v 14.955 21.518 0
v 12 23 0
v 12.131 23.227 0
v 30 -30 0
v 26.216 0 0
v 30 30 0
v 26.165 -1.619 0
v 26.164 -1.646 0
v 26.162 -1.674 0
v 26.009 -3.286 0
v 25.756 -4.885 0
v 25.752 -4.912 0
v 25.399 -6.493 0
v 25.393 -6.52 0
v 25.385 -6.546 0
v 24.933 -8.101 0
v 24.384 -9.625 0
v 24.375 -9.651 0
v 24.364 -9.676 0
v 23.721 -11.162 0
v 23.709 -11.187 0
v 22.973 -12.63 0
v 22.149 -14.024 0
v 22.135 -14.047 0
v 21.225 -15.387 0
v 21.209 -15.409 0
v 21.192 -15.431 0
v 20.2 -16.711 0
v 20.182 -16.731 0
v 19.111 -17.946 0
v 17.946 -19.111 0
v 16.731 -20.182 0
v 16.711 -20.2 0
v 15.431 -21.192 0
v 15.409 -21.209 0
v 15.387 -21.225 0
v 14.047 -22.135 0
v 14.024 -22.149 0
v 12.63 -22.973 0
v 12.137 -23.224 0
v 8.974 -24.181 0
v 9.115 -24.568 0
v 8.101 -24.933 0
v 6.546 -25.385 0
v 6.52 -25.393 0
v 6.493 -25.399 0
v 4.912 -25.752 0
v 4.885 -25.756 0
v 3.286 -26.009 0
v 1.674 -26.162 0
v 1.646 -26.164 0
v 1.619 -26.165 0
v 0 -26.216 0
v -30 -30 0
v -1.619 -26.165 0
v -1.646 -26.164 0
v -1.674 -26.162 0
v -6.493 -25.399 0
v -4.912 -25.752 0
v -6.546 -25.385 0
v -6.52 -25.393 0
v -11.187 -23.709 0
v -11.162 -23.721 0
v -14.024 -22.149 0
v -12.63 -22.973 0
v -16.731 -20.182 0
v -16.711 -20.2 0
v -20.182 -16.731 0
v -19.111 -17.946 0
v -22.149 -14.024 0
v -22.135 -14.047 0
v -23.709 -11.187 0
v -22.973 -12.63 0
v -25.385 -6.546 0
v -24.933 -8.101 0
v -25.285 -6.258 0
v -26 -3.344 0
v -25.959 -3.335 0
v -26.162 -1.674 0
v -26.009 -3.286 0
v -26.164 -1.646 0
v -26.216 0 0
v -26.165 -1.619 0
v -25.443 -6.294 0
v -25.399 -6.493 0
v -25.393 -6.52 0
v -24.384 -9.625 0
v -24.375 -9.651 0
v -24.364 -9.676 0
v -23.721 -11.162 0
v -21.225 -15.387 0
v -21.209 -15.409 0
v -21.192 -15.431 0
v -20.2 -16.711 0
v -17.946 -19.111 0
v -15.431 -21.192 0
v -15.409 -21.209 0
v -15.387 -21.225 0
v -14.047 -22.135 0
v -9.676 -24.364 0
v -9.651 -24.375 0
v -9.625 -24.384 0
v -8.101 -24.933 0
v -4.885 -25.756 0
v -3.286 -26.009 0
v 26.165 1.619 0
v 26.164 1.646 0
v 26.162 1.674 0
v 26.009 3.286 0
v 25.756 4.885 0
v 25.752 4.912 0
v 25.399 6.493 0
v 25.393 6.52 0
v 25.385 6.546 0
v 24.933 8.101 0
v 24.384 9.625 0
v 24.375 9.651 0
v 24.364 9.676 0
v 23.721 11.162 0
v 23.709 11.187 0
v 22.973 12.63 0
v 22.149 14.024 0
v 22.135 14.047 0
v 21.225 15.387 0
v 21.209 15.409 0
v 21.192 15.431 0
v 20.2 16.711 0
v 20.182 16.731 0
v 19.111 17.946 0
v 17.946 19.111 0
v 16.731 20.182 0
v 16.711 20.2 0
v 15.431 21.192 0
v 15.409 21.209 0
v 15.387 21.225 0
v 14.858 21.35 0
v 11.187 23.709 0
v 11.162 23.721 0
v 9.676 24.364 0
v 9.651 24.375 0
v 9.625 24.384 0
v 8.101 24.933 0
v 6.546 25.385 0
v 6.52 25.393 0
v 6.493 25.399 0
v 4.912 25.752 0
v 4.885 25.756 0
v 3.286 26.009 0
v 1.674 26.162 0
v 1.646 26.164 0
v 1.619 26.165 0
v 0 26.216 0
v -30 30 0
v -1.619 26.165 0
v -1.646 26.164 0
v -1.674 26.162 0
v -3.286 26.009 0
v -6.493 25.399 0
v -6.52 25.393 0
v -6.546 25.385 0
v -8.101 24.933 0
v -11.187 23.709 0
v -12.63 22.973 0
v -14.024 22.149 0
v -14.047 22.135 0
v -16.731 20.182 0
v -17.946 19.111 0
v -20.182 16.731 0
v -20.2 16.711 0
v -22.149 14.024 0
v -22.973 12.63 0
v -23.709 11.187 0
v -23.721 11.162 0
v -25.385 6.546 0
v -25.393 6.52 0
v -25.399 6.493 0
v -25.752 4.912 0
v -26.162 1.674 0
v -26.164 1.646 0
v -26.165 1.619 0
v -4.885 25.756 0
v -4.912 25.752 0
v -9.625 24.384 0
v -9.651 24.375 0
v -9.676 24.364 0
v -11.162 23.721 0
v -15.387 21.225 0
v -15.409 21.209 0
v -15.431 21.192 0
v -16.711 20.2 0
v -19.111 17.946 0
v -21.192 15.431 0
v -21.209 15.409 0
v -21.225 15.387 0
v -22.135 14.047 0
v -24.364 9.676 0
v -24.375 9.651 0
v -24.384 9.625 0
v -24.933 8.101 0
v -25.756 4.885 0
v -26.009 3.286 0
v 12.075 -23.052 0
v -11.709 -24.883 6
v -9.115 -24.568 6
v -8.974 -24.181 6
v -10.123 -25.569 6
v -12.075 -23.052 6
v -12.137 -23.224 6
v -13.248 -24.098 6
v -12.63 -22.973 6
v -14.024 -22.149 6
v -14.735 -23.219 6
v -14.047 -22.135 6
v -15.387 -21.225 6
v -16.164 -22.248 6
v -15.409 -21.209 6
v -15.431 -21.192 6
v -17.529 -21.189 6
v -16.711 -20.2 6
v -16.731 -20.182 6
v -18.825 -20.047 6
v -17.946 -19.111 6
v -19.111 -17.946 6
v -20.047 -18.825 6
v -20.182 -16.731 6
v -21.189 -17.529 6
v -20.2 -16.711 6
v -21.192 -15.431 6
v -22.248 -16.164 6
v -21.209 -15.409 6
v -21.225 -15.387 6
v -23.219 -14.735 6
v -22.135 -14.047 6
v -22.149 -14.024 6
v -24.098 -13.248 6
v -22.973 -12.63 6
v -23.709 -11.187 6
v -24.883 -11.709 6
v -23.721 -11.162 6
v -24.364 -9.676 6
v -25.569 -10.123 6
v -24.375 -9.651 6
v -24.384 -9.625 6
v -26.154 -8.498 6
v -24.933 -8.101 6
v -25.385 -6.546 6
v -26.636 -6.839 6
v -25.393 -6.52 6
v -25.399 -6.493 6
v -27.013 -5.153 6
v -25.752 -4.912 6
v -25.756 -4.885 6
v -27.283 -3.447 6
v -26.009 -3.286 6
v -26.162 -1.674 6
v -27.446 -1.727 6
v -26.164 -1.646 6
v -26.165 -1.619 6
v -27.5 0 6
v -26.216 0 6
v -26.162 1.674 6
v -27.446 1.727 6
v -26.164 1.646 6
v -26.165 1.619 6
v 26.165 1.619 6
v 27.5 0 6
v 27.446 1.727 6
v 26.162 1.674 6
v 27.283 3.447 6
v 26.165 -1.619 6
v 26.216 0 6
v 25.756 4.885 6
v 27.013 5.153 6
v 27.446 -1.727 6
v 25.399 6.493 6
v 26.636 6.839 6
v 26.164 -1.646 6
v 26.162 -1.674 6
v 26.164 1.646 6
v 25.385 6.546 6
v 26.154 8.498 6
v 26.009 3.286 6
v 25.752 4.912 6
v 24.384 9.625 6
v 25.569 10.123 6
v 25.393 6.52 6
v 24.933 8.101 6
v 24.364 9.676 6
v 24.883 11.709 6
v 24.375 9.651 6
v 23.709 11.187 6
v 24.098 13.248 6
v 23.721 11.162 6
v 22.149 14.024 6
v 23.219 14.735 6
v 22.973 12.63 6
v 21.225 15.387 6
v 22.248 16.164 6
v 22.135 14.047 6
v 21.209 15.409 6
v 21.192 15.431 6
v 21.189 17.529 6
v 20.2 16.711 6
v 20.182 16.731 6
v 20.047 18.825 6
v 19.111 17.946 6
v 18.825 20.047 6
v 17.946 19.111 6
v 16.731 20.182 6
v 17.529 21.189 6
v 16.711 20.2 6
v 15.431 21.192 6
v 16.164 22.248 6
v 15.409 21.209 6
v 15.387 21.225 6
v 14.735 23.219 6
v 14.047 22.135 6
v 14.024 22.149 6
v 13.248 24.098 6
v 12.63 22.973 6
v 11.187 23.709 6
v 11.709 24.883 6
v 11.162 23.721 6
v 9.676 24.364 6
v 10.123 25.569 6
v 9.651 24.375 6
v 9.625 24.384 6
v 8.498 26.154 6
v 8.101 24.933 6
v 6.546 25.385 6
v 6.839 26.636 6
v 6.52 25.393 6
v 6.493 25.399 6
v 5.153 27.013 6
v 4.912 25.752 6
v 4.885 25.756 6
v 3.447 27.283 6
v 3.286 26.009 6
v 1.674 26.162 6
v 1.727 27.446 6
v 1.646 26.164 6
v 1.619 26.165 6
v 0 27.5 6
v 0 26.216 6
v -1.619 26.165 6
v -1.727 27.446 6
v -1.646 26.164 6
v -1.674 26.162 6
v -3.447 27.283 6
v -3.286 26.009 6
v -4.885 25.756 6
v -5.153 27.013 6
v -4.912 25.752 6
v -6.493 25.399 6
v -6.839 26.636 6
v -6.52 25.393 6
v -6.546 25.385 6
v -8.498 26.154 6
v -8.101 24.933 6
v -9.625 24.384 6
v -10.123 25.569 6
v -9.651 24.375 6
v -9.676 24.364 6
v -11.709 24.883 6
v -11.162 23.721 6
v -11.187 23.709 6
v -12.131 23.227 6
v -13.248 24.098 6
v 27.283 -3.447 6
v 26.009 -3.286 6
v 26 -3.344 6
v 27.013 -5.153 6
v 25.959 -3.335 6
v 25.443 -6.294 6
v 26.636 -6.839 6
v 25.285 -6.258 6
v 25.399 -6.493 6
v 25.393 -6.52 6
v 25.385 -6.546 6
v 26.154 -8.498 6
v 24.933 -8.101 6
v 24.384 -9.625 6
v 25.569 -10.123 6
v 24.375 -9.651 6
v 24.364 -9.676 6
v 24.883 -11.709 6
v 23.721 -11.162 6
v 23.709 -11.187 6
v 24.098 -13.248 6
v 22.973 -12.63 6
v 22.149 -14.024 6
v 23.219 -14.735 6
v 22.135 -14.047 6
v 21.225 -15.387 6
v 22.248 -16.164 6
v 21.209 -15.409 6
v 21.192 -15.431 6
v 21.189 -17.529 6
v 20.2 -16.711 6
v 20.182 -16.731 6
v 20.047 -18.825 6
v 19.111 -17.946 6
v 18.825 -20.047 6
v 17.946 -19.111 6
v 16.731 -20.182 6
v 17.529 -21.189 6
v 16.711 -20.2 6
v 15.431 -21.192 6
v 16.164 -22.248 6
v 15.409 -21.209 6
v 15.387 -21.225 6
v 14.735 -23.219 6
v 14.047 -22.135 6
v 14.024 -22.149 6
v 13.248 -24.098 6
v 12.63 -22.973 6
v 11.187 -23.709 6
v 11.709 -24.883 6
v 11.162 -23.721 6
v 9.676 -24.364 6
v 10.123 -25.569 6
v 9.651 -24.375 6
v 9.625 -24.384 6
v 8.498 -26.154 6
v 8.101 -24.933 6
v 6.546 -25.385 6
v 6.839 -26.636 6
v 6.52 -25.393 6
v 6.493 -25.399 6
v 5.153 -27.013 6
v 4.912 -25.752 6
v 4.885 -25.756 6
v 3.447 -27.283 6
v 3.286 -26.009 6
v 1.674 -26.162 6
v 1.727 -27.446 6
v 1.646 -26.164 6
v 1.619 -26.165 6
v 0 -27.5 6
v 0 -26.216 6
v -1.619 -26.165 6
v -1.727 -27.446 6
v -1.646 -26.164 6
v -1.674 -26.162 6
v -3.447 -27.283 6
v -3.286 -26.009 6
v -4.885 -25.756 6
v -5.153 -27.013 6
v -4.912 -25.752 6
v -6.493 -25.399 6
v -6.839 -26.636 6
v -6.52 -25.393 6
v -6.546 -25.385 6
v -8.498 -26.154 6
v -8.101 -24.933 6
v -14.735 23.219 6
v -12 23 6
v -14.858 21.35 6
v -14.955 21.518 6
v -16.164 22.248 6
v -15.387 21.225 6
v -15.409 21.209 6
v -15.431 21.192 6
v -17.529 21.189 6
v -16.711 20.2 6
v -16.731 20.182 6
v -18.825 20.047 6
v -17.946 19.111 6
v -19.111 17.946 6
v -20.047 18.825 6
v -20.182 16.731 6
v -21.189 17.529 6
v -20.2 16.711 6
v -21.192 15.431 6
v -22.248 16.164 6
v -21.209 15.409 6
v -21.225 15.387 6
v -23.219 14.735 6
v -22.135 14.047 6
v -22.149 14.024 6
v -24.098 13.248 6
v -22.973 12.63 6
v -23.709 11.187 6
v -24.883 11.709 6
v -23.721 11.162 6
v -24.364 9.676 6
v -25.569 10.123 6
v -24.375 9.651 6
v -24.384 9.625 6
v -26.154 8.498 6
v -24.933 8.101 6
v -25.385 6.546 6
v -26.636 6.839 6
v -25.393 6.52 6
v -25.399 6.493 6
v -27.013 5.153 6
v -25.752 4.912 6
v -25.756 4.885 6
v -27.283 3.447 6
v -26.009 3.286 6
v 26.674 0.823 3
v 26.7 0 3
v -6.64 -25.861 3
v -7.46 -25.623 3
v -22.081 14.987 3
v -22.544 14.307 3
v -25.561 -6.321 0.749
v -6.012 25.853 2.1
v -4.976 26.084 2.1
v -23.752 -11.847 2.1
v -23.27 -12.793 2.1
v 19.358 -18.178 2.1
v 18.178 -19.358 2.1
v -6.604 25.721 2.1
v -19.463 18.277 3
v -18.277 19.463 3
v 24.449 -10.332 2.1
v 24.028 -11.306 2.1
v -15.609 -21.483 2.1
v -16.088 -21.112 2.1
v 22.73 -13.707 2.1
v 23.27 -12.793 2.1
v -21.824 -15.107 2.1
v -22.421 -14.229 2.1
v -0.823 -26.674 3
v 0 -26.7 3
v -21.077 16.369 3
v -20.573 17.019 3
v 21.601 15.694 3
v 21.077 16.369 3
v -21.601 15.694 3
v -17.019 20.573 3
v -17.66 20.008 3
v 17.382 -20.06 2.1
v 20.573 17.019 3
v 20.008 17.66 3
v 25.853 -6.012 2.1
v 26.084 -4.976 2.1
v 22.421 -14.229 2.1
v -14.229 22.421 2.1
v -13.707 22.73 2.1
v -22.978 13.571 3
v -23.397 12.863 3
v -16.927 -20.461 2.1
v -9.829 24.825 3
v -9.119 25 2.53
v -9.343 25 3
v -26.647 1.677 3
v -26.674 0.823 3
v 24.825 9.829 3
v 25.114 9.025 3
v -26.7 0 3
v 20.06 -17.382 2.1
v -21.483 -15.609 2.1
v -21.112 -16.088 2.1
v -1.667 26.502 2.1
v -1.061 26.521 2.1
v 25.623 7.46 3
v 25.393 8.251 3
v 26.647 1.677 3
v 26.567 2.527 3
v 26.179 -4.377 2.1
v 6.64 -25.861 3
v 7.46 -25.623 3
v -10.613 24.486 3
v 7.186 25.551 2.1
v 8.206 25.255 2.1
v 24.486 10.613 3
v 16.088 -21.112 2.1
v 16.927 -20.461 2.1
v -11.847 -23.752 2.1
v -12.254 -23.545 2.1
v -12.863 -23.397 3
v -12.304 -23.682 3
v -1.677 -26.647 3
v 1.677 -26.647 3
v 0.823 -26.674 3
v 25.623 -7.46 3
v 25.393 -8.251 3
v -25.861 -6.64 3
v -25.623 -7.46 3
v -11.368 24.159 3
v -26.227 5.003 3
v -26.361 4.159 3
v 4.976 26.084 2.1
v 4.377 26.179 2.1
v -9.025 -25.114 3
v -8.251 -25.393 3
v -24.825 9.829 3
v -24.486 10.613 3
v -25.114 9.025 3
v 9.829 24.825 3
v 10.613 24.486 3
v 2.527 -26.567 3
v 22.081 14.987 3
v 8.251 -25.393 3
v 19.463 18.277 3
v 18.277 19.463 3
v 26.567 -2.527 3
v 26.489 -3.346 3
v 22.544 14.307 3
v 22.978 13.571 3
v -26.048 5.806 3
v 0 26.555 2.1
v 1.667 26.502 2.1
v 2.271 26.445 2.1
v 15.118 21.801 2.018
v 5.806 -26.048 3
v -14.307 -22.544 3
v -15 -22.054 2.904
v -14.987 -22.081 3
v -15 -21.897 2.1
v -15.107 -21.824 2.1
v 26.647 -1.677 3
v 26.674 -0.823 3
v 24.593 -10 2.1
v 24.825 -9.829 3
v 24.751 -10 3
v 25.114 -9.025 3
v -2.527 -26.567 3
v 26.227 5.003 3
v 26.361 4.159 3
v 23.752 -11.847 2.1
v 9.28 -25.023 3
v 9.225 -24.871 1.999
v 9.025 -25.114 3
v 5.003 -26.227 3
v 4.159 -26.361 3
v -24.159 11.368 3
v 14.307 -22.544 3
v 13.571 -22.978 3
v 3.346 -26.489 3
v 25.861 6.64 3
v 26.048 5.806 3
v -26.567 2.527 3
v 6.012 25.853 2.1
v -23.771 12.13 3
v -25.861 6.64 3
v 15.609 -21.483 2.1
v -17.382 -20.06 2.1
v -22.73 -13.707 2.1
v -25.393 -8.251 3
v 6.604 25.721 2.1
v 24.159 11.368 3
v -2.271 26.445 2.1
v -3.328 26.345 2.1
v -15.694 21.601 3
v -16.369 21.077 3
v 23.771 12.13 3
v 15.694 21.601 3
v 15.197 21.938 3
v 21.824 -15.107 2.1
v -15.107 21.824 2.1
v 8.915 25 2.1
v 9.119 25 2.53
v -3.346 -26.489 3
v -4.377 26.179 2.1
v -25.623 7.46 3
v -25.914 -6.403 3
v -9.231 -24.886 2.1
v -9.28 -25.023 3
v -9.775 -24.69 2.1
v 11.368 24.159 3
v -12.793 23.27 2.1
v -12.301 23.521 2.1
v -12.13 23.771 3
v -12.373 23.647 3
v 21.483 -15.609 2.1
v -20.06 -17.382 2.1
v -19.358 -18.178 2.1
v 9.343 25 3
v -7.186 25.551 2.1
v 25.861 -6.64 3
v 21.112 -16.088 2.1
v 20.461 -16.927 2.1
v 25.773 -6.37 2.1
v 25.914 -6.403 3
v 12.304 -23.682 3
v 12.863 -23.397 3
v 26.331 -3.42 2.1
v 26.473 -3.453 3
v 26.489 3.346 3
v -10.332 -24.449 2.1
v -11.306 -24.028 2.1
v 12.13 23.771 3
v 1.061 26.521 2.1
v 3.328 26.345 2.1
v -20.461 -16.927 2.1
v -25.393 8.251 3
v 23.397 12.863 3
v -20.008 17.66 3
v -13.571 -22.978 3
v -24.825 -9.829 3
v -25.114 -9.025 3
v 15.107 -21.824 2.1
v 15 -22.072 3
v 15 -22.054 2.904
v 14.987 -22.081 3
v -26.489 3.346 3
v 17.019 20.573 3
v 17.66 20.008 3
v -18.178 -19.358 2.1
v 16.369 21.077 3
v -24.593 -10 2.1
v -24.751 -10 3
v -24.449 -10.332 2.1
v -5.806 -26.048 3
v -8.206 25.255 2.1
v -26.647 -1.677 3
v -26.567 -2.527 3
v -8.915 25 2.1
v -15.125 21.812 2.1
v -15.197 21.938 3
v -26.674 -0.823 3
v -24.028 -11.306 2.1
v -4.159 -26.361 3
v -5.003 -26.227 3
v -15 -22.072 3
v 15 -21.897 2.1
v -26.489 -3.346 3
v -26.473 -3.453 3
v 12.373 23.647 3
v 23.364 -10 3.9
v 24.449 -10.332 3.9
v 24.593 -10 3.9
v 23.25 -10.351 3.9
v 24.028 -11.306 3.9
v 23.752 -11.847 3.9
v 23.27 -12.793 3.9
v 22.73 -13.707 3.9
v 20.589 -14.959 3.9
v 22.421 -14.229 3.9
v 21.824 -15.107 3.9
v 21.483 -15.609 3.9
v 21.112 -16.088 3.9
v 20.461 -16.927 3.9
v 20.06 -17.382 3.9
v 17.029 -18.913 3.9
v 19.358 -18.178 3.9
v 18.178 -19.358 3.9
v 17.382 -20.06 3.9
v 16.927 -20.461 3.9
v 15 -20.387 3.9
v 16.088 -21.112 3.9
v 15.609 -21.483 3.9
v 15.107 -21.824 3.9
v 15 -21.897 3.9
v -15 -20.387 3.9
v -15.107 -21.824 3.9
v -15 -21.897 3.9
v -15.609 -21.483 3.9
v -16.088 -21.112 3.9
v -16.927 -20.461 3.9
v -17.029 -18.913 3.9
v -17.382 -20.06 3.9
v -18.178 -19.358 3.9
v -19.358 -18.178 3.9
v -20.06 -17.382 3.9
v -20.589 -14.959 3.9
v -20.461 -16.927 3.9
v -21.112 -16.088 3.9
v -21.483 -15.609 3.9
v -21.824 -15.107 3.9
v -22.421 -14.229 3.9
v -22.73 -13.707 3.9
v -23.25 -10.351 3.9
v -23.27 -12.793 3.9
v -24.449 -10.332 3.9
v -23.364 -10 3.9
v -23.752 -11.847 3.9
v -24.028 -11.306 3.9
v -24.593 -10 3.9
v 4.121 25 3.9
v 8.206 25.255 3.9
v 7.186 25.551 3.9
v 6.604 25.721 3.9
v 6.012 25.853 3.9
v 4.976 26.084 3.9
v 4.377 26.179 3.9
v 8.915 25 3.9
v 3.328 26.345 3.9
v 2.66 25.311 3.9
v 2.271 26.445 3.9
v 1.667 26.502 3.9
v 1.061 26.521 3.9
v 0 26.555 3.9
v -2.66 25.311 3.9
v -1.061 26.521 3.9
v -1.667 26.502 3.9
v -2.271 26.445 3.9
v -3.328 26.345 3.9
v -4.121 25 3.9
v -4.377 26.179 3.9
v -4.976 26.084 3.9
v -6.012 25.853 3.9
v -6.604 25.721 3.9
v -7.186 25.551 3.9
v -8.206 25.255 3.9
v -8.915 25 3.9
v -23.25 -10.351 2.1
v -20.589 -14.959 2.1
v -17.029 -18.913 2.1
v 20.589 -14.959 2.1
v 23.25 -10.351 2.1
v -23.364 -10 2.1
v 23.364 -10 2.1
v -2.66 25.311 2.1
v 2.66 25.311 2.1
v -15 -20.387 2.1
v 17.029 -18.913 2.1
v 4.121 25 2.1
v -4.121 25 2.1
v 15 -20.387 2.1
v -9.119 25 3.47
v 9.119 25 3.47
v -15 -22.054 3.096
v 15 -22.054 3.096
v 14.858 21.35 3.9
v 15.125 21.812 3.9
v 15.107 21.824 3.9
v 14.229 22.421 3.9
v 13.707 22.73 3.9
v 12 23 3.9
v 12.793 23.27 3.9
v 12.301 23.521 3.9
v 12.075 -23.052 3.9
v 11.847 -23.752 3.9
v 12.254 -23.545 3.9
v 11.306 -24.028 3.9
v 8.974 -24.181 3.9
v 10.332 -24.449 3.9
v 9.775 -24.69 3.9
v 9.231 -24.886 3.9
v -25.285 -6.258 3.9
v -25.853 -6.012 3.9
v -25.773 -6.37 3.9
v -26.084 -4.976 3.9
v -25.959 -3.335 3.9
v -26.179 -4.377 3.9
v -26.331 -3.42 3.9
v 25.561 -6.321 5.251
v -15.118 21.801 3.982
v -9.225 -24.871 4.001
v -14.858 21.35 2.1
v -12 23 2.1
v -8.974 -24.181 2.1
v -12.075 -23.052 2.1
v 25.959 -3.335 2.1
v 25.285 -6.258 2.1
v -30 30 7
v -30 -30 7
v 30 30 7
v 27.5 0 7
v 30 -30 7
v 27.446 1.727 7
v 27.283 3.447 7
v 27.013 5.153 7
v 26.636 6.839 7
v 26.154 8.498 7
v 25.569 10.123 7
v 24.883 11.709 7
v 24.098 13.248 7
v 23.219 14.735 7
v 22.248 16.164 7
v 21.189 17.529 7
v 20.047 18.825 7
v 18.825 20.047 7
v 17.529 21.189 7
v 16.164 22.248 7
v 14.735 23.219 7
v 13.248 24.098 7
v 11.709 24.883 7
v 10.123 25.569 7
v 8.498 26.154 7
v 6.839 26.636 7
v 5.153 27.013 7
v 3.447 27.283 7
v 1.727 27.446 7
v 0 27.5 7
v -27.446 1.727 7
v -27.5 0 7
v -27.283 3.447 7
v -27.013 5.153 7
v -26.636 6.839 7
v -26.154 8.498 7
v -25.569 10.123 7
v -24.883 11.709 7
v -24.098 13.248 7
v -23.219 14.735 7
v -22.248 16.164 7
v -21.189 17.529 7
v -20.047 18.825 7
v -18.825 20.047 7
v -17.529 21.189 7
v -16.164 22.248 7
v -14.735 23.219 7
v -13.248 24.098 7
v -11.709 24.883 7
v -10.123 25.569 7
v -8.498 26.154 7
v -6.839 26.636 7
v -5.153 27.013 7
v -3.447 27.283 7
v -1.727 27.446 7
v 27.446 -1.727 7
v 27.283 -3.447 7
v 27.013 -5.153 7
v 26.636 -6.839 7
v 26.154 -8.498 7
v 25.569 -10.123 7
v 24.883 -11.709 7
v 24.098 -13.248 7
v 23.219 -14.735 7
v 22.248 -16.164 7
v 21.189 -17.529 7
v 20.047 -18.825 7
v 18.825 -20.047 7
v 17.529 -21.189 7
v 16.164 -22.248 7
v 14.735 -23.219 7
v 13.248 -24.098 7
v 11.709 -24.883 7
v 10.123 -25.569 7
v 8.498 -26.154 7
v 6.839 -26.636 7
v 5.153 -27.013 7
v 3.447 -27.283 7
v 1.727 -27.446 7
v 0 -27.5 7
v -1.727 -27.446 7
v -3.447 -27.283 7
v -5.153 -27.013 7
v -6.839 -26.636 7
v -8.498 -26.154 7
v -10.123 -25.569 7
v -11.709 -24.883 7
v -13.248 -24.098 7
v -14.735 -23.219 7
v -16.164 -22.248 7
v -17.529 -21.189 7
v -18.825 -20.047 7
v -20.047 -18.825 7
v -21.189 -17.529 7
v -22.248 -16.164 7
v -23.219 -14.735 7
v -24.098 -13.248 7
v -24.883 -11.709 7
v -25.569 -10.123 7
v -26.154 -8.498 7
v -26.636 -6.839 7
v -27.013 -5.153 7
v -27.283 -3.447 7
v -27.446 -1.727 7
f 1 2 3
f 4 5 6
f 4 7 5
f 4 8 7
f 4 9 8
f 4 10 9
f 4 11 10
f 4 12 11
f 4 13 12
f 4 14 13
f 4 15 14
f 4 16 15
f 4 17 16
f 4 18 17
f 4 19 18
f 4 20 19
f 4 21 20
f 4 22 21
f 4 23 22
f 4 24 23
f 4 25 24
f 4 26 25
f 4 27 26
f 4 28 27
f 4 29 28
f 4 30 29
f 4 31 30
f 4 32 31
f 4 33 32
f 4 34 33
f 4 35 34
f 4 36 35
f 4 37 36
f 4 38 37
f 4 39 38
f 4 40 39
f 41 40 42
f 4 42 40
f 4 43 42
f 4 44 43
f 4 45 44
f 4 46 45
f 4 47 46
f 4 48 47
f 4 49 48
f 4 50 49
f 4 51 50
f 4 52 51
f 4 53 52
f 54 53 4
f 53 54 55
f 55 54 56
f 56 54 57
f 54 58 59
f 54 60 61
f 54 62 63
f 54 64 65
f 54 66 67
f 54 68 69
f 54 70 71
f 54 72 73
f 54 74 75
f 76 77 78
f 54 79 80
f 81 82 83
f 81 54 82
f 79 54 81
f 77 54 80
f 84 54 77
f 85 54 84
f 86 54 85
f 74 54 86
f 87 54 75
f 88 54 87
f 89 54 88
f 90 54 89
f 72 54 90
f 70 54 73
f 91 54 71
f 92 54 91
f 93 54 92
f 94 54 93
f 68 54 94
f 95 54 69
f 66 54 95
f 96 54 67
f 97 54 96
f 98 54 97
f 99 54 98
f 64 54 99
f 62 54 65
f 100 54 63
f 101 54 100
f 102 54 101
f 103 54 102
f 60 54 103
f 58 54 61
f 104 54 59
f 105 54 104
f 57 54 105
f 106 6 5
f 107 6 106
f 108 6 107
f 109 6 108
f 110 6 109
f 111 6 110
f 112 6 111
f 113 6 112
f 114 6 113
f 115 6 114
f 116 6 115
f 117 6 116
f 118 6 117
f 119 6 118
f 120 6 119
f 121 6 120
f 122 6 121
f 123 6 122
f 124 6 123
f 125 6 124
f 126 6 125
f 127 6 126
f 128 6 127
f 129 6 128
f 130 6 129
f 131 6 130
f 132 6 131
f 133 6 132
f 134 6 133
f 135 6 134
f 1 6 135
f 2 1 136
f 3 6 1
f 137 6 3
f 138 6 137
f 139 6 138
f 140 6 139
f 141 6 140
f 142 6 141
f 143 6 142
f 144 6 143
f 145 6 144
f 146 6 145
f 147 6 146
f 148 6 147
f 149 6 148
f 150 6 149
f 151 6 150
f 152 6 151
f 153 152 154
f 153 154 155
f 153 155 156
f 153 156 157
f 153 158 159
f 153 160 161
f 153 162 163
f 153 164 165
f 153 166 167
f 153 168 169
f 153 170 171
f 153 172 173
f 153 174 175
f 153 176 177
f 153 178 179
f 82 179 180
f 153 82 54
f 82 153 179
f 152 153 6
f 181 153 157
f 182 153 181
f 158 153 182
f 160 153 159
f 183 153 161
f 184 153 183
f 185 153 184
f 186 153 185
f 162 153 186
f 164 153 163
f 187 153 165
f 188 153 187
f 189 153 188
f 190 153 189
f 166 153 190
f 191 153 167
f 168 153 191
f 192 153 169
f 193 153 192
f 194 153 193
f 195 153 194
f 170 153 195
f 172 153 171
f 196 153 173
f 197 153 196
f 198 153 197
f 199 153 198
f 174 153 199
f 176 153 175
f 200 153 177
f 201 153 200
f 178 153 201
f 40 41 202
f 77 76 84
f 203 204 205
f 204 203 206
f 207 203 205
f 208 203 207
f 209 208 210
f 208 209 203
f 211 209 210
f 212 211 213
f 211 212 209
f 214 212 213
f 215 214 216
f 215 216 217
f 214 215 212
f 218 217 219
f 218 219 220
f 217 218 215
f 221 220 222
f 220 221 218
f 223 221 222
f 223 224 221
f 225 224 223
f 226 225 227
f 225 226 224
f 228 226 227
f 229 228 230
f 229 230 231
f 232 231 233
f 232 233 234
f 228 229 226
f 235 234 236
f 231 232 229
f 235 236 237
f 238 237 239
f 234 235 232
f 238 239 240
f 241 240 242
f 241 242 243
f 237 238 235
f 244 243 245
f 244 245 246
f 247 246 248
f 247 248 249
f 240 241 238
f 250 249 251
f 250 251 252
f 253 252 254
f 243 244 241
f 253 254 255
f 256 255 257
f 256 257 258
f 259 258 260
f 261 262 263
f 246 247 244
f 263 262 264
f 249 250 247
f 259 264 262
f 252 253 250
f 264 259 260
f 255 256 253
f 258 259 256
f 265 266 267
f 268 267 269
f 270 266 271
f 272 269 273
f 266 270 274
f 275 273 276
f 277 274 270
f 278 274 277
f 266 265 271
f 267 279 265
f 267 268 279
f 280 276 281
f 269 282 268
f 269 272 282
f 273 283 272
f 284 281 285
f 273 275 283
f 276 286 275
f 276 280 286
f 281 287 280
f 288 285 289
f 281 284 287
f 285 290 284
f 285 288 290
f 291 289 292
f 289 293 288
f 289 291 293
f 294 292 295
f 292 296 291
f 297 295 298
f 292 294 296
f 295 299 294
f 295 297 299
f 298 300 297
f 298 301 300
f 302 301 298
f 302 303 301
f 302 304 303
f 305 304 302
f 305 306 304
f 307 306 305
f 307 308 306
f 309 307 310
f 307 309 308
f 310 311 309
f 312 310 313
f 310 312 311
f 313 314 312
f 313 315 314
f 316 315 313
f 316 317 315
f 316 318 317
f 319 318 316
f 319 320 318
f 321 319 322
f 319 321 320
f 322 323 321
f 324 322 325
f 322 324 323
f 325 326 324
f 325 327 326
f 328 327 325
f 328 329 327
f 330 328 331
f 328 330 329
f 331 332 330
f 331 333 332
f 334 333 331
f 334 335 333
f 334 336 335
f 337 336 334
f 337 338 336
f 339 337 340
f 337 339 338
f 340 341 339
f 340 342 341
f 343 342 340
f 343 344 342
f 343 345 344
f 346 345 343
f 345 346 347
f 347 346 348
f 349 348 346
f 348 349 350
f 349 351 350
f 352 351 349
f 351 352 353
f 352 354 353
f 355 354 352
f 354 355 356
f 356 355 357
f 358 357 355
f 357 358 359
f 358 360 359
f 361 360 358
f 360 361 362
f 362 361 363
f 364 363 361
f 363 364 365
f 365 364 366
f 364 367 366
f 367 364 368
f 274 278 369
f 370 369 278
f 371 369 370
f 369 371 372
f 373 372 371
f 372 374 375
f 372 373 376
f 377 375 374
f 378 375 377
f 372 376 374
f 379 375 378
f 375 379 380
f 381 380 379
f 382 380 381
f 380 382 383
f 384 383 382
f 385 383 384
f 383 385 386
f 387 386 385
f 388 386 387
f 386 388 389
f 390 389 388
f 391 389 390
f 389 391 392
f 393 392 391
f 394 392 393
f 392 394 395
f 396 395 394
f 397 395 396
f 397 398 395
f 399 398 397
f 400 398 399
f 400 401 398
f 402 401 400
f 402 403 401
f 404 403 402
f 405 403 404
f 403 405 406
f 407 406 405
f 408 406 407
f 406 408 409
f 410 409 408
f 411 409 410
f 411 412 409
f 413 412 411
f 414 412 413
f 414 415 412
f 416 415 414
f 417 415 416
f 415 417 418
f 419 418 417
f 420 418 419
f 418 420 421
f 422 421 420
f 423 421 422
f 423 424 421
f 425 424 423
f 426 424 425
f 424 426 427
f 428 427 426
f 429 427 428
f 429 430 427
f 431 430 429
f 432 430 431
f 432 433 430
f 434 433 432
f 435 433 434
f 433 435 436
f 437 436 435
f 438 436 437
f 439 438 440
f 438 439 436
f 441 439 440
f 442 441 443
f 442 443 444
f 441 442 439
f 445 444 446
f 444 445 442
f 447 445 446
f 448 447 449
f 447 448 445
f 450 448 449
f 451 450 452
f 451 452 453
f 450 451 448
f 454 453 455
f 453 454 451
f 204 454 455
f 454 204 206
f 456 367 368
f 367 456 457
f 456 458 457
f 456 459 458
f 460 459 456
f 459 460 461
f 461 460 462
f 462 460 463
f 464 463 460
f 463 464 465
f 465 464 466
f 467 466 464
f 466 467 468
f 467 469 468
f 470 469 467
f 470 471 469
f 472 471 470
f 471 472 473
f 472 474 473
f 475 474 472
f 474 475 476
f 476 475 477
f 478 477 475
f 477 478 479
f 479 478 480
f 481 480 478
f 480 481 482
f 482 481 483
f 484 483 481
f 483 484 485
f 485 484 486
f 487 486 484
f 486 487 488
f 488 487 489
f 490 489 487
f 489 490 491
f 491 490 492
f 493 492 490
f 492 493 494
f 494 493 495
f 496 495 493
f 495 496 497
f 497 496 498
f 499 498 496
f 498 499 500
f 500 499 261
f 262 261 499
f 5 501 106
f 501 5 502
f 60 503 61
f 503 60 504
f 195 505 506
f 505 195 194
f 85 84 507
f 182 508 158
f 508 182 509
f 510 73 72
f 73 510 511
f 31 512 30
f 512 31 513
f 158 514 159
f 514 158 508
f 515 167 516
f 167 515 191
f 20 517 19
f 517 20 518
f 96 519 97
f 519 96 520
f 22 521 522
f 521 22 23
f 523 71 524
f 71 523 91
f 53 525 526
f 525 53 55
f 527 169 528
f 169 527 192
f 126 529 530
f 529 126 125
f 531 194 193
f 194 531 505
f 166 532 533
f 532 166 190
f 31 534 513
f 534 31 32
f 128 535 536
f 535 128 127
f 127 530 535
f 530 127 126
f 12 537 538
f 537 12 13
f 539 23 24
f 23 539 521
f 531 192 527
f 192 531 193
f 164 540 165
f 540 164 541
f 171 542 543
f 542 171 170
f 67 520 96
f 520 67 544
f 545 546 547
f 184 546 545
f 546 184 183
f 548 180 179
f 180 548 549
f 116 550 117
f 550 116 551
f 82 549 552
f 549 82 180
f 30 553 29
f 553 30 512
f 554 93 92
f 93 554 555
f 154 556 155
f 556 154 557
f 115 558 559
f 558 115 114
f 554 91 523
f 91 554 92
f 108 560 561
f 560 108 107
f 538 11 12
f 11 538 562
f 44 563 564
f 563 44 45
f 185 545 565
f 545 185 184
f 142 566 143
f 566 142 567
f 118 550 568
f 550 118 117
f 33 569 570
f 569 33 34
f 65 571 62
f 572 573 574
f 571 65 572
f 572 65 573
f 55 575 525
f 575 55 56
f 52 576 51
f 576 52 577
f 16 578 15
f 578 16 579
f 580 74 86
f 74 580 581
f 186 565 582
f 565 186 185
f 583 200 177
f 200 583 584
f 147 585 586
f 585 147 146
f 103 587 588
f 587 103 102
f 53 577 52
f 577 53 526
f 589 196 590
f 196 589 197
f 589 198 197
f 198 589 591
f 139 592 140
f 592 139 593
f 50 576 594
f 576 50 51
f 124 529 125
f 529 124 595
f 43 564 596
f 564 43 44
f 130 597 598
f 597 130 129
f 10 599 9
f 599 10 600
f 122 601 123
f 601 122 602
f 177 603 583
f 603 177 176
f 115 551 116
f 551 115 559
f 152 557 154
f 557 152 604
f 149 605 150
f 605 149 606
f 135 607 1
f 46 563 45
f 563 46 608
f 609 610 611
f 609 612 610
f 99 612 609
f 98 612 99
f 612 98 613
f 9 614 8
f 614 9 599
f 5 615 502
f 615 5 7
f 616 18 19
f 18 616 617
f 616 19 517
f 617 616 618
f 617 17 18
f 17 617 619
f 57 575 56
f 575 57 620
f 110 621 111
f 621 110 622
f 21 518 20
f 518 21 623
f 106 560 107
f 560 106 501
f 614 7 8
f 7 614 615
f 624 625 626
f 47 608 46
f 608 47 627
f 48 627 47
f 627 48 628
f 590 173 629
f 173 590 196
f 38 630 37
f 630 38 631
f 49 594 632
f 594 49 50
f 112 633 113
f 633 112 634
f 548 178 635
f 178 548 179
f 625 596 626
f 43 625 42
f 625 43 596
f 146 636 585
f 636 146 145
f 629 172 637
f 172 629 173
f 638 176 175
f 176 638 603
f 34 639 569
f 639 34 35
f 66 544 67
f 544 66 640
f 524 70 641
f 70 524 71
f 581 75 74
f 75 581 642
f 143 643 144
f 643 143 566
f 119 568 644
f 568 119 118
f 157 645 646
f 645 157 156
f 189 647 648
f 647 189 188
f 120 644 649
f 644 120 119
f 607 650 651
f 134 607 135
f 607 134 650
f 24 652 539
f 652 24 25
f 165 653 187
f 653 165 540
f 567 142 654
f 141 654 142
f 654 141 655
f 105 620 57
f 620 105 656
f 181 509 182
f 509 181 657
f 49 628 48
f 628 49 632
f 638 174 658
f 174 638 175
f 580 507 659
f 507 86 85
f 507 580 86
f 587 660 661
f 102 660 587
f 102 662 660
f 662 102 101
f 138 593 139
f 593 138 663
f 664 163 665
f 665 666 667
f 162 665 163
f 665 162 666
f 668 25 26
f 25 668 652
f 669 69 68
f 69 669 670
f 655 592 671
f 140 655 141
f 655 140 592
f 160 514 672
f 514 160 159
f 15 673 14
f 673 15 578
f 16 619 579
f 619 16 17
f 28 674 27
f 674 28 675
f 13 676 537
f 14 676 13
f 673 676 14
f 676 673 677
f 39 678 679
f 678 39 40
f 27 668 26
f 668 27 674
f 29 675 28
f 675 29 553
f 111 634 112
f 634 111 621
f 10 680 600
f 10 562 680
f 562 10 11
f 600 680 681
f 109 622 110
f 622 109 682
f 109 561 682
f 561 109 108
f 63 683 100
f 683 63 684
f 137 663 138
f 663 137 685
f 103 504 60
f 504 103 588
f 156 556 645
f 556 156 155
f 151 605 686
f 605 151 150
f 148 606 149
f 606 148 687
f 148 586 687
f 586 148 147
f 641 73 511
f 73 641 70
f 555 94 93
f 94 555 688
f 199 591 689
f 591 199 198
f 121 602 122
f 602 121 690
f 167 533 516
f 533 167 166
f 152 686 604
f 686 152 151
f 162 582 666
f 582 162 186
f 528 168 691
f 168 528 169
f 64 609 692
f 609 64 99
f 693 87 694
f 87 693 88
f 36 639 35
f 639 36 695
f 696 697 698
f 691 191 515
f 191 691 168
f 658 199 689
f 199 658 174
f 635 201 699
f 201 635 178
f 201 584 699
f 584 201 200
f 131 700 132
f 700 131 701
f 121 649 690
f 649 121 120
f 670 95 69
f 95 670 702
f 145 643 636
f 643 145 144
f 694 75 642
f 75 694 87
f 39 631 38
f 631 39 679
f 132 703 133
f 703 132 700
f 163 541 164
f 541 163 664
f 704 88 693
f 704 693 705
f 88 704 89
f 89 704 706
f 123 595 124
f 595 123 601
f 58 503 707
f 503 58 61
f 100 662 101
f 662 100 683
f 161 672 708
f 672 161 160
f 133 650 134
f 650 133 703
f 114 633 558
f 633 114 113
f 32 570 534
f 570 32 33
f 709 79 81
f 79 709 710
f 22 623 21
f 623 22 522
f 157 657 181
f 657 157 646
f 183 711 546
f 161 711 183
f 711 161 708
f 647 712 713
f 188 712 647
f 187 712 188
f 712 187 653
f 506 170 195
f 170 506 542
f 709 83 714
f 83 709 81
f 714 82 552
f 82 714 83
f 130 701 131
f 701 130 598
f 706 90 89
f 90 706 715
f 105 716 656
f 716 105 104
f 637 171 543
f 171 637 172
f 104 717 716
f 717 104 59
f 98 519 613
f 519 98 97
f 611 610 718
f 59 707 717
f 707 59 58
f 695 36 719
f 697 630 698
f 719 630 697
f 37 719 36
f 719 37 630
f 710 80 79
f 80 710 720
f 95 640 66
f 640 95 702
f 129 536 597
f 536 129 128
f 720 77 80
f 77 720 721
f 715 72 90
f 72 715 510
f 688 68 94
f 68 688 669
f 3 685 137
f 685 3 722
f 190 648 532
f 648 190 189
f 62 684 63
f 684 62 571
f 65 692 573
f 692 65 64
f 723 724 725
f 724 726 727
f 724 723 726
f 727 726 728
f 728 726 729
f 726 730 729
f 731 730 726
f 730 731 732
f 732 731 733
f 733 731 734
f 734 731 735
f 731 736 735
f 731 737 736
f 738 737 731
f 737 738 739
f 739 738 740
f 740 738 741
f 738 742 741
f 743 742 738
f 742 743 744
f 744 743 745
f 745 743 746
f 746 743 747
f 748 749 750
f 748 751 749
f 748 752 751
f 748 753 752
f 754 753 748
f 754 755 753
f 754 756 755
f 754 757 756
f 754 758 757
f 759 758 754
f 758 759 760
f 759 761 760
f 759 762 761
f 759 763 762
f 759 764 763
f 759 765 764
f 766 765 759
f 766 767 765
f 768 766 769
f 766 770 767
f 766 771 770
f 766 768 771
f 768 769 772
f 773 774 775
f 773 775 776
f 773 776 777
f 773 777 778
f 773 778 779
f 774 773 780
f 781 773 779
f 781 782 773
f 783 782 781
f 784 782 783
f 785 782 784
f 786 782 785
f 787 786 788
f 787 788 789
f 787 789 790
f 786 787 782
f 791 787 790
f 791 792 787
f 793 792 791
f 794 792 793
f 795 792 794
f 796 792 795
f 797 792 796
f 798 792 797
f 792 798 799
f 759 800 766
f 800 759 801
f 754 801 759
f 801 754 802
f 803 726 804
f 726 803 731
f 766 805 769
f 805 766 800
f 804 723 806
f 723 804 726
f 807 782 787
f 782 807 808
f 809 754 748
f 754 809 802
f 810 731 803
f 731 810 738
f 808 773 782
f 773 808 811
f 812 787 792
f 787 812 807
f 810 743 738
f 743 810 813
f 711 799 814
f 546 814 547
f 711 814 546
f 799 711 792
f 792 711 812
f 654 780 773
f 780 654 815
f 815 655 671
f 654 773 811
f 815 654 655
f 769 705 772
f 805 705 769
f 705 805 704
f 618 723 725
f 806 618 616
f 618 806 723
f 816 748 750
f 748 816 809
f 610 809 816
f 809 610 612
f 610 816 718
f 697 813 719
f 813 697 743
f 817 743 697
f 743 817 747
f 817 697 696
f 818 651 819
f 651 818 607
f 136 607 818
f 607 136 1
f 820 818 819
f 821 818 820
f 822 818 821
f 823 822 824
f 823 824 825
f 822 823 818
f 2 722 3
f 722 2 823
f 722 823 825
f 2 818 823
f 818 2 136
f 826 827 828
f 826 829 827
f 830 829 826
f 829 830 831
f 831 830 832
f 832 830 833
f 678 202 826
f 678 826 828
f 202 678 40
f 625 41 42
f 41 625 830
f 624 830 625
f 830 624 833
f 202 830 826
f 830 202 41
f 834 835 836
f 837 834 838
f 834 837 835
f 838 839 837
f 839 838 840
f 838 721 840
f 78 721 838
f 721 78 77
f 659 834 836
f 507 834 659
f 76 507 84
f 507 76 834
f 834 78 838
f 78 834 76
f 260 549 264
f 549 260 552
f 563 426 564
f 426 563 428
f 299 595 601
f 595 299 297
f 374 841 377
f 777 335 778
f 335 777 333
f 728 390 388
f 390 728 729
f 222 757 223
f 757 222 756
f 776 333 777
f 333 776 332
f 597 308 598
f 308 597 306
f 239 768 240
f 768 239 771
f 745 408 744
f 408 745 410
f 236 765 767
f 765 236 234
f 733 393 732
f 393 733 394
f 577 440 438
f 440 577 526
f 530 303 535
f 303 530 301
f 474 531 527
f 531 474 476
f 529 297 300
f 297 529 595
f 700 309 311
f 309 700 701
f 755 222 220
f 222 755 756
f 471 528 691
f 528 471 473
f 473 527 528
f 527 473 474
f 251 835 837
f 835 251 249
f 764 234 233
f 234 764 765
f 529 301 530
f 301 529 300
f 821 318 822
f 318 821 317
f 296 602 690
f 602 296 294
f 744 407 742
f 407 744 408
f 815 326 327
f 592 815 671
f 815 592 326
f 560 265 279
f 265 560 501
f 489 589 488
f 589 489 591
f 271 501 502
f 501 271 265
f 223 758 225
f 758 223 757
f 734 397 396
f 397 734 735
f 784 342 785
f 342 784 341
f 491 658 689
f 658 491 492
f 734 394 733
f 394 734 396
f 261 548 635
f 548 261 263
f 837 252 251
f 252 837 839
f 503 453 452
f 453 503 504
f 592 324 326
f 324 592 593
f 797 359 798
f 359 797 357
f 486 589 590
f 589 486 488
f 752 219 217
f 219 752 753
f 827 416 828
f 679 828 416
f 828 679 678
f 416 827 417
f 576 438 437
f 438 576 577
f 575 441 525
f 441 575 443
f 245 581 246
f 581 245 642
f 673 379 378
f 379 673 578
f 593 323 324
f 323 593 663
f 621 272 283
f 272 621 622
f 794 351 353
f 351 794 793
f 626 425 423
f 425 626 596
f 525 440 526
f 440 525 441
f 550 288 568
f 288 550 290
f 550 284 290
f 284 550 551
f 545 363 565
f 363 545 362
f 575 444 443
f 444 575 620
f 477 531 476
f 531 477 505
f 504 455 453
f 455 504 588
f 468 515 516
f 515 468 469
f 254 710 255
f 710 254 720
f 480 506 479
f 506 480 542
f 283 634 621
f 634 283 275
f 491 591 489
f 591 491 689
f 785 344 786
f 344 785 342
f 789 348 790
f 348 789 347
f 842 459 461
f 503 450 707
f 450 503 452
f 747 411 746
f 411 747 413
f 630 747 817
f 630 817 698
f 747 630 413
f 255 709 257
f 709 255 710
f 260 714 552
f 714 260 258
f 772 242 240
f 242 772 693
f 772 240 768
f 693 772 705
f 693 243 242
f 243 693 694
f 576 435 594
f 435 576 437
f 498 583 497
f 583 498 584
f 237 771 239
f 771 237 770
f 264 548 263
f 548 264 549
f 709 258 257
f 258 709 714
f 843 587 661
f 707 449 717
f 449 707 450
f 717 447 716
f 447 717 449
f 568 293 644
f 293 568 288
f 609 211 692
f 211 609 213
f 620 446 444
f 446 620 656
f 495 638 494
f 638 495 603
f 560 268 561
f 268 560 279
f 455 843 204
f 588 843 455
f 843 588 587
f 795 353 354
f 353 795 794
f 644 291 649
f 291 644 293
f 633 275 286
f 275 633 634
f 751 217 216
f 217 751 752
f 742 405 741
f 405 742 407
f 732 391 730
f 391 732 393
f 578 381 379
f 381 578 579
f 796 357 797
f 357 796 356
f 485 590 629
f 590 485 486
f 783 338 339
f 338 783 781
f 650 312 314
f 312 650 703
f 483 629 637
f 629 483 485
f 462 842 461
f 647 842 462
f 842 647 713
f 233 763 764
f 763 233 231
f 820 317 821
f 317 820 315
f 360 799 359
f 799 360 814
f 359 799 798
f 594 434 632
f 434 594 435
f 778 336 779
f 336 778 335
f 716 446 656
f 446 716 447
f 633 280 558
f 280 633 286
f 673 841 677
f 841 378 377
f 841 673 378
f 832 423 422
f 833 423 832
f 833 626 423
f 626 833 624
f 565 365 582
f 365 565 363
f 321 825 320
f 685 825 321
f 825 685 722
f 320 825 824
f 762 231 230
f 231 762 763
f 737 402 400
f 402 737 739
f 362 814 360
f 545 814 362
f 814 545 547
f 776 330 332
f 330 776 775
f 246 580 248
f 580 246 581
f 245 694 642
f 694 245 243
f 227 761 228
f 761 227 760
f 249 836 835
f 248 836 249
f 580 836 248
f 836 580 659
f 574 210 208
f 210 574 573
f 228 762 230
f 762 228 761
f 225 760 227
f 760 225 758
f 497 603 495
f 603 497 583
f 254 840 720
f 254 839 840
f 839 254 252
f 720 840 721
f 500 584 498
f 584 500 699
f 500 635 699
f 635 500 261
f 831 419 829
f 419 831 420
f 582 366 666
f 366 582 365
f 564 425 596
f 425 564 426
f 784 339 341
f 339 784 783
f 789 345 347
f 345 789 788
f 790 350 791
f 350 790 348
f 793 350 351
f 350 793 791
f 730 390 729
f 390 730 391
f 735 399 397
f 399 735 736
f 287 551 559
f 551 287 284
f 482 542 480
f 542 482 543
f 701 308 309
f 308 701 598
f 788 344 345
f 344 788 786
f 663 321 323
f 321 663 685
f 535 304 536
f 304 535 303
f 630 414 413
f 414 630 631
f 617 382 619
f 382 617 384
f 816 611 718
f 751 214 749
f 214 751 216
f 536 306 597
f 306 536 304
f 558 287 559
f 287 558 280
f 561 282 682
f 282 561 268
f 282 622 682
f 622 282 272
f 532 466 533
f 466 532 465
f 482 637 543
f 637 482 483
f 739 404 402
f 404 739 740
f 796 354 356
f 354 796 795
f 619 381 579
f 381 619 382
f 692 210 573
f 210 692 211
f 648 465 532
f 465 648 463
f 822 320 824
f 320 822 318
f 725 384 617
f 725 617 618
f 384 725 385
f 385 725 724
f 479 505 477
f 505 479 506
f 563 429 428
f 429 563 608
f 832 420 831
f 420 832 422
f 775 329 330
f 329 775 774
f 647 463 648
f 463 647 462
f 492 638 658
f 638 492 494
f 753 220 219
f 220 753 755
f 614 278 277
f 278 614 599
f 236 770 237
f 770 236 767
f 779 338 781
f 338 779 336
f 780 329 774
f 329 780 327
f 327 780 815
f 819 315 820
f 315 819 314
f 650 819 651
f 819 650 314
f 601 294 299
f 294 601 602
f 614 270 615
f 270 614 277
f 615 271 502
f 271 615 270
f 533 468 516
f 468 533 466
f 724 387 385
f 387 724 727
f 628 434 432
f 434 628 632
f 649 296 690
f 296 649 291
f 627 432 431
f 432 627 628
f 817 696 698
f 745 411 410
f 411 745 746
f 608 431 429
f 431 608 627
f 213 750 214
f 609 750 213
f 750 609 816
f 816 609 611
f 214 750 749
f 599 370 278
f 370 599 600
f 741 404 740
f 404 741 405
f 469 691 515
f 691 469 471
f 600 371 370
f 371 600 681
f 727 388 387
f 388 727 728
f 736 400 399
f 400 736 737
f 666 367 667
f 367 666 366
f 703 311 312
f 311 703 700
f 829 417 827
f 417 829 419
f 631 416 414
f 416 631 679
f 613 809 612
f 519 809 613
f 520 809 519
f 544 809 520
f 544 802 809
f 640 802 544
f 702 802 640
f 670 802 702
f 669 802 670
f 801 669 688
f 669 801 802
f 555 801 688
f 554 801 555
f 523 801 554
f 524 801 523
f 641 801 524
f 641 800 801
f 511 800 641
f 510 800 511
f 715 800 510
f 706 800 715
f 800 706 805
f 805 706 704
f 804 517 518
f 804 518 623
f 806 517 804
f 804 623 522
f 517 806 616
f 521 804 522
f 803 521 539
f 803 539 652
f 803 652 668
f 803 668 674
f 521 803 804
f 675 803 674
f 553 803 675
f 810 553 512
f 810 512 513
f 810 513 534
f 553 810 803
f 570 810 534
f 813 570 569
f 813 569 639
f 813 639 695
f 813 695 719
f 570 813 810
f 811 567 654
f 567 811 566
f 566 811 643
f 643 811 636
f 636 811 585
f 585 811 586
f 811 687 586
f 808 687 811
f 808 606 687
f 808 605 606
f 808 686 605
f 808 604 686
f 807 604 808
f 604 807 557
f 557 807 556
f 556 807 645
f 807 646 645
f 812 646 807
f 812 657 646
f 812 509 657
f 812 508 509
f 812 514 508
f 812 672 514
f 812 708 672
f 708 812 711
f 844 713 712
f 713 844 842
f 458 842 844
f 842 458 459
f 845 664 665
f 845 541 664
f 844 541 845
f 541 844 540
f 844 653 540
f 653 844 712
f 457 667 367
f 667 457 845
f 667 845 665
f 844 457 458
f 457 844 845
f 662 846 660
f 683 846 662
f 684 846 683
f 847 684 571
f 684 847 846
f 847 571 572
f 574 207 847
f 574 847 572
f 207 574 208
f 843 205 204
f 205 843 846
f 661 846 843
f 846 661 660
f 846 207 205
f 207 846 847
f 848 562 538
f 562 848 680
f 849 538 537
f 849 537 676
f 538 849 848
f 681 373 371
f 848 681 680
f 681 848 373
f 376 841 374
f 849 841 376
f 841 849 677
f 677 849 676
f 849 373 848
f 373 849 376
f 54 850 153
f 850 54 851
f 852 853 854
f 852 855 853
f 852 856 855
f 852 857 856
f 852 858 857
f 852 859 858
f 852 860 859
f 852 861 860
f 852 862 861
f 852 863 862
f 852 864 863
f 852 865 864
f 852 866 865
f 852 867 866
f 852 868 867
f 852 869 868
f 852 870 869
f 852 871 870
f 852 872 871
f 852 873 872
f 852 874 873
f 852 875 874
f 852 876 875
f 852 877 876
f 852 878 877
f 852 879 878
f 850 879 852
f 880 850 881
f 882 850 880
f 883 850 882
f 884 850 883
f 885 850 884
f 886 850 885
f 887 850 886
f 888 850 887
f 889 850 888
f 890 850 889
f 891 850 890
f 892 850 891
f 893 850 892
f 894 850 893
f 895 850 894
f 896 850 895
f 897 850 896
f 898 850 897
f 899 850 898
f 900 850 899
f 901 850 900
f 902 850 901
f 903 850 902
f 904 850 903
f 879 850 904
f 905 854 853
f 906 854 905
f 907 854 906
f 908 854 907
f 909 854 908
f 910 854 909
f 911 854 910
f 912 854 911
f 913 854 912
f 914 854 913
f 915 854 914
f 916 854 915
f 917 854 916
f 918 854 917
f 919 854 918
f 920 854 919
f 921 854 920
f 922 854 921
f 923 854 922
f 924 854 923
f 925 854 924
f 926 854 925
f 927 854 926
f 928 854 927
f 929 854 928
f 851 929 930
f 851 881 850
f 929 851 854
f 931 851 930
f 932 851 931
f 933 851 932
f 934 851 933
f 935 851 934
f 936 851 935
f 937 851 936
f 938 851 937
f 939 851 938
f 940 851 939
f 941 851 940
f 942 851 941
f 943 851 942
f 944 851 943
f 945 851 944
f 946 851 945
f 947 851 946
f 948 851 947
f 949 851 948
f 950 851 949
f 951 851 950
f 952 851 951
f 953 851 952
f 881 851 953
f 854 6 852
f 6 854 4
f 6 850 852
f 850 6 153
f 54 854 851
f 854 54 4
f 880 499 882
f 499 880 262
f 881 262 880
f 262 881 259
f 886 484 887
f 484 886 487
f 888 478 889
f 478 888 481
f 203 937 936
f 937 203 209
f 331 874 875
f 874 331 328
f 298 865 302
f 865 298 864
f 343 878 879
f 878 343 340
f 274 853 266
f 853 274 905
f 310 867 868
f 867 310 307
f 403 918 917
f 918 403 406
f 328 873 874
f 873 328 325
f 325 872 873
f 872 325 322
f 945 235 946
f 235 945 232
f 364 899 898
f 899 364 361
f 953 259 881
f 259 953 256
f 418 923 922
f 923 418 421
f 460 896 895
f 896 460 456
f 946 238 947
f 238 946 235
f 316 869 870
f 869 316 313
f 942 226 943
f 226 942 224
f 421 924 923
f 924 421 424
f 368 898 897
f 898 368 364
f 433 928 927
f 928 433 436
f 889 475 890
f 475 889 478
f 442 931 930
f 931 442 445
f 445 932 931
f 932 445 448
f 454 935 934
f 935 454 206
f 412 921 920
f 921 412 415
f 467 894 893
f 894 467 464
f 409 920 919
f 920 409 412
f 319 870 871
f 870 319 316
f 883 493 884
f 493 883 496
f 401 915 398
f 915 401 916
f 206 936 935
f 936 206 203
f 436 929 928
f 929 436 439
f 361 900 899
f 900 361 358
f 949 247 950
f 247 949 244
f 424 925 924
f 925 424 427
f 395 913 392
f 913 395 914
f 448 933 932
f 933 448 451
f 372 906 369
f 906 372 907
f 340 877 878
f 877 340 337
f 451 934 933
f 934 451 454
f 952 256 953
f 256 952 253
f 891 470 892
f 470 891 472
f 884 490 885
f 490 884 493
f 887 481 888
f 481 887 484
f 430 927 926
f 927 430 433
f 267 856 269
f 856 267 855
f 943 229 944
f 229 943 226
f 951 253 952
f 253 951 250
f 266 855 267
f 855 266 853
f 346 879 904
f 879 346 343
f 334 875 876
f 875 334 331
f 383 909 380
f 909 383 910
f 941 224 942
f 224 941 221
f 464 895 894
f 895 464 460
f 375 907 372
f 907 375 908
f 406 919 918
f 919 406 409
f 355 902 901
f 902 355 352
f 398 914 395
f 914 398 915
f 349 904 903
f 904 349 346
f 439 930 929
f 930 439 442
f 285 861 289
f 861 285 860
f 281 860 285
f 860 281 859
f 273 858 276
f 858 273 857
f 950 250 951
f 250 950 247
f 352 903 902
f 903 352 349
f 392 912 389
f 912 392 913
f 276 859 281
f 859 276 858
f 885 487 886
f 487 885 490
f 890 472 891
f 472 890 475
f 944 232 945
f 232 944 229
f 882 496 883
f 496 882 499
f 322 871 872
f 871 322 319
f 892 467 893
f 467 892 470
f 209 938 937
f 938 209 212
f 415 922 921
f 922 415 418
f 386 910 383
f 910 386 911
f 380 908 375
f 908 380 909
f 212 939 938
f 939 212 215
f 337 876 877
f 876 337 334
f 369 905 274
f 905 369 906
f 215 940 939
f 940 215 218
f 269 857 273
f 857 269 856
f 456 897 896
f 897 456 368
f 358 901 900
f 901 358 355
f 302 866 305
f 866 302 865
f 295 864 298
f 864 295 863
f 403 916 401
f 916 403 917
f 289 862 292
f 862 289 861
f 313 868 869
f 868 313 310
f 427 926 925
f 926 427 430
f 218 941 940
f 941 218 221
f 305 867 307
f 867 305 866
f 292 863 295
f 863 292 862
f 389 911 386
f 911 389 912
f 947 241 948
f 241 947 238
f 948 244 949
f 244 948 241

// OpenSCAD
// file: ../../library.scad
module tubo(
	h/*Altura*/,
	w/*Pared*/,
	d/*Diametro*/
){
  difference()
  {
    cylinder(r=(d/2), h);
    translate([0,0,-0.1])
    cylinder(r=(d/2)-(2*w), h+0.2);
  }
}

module huyoMasPared(
	d/*Diametro del hoyo*/,
	w/*Pared*/,
	h/*Altura*/,
){
  difference()
  {
    cylinder(r=((d+(2*w))/2), h);
    translate([0,0,-0.1])
    cylinder(r=(d/2), h+0.2);
  }
}

module cuboMasPared(
    w1, //Largo
    w2, //Ancho
    p1, //Pared
    p2, //Pared
    h   //Alto
)
{    
    difference()
    {
        translate([-(w1+(p1*2))/2,-(w2+(p2*2))/2,0])
        cube([(w1+(p1*2)),(w2+(p2*2)),h]);
        
        translate([-w1/2,-w2/2,-0.2])
        cube([w1,w2,h*2]);
        
    }
    
    
}

soporteW = 0.7;

module soporteCylinder()
{
  difference()
  {
	cylinder(r=radio,altura);

	translate([0,0,-0.1])
	cylinder(r=radio-soporteW,altura+0.2);
  }

  if(true){
  difference()
  {
	cylinder(r=radio+0.75,1);

	translate([0,0,-0.1])
	cylinder(r=radio-0.75,1.25);
  }}

}

module soporteOval()
{
  difference()
  {
	oval(w=ancho, h=largo, height=alto, center = false);

	translate([0,0,-0.1])
	oval(ancho-soporteW, largo, alto+0.2);
  }

  difference()
  {
	oval(w=ancho+1, h=largo+1, height=1, center = false);

	translate([0,0,-0.1])
	oval(w=ancho-1, h=largo-1, height=1.25, center = false);
  }

}


module oval(w,h, height, center = false)
{
  scale([1, h/w, 1]) cylinder(h=height, r=w, center=center);
}
// file: Diffracter.scad
//include <Tapa.scad>
include <../../library.scad>


bigW = 88;
ori = bigW/2;
raspSellR = 59;
tuboH = 140;
H = 18.5 + 9;
selloH = 7;
tornR = 2;

huecoPared = 12;
huecoH = 22;
selloHembraRadio=40;

//Activate this to display
if(0)
{
//translate([0,0,bigW/2])
//rotate([0,90,0])
diffracter();


//soporteCylinder(radio=25.2,altura=3.8);

}


module diffracter(){	

difference(){

//Bloque
translate([-bigW/2,-bigW/2,0])
cube([bigW,bigW,H]);

/*
translate([
						-(bigW-huecoPared)/2,
						-(bigW-huecoPared)/2,
						(huecoH/2)
					])
		cube([
					bigW-huecoPared,
					bigW-huecoPared,
					H-huecoH]
				);*/


//Diffractador
translate([-37.25,-40,-0.1])
cube([74.5,80,5.6]);

//Macro
translate([0,0,5.4])
cylinder(r=(74.5/2),8.2,$fn=100);

//Sello de raspberry
//translate([0,0,-0.1])
//cylinder(r=(raspSellR/2)+1,2);

//Tubo
//translate([0,0,-0.1])
//cylinder(r=(52/2),200);

//Tornillos abajo
translate([-ori+4,-ori+4,-0.1])
cylinder(r=tornR,20);
translate([ori-4,-ori+4,-0.1])
cylinder(r=tornR,20);
translate([-ori+4,ori-4,-0.1])
cylinder(r=tornR,20);
translate([ori-4,ori-4,-0.1])
cylinder(r=tornR,20);

//Hueco
cylinder(r=36,H+1);

//Tornillos caja
translate([0,0,(tuboH/2)-7])
rotate([0,90,0])
tornillosArriba();

//Tornillo tripie
translate([-ori-0.1,0,(tuboH/2)+7])
rotate([0,90,0])
cylinder(r=5/2,5.31);

//Sello hembra
//translate([0,0,H-3])
//cylinder(r=selloHembraRadio,4);

}

//Sello cobertura
//translate([0,0,H-1])
//huyoMasPared(58,3,3);


}
// file: CannonRosca.scad
include <Diffracter.scad>
//include <navaja.scad>

cannonDiam1 = 52.4;
cannonDiam2 = 54.4;
cannonPared = 3;
cannonNavBase = 3;
cannonH = 6;//14-cann..

if( 1 )
{
    allRosca();
}

module allRosca()
{
    
    roscaHembraCannon();



}

module roscaHembraCannon()
{
    
    //creaOrejas();
    
difference()
{

cylinder(r=30,cannonH, $fn=100);
//cylinder( r1=(cannonDiam1+(cannonPared*2))/2, r2=(cannonDiam2+(cannonPared*2))/2, cannonH, $fn=100 );
translate([0,0,-0.1])
cylinder( r1=(cannonDiam1/2), r2=cannonDiam2/2, cannonH+0.2, $fn=100 );
   
}

translate([0,0,cannonH-3.4])
difference()
{
    cylinder( r=(cannonDiam1+7)/2, 1.3  );
    
    translate([0,0,-0.1])
    cylinder( r=(cannonDiam1-1.5)/2, 2  );
    
    rotate([0,0,0])
    translate([-35,-10,-2])
    cube( [70,35,5] );

    rotate([0,0,90])
    translate([-70,-15,-2])
    cube( [70,30,5] );
}


translate([12,23,0])
rotate([0,0,-30])
cube([3.3,3,cannonH-3.4+1.3]);

translate([10,-27,0])
rotate([0,0,20])
cube([3.3,3,cannonH-3.4+1.3]);

translate([-28.5,-7,0])
rotate([0,0,13])
cube([3.3,3,cannonH-3.4+1.3]);





}







module creaOrejas()
{
    translate([0,36,0])
    cylinder(r=8,9,$fn=100);

    translate([31,-18,0])
    cylinder(r=8,9,$fn=100);

    translate([-31,-18,0])
    cylinder(r=8,9,$fn=100);
}

//creaNavajas();

module tornTriang()
{
    translate([-32,-18,-0.1])
    cylinder(r=3,10,$fn=20);
    
    translate([32,-18,-0.1])
    cylinder(r=3,10,$fn=20);
    
    translate([0,36,-0.1])
    cylinder(r=3,10,$fn=20);
    
}
// main file
include <CannonRosca.scad>




if( 1 )
{
    translate([0,0,7])
    rotate([0,180,0])
    genericCannonRosca();
}






module genericCannonRosca()
{

translate([0,0,1])
roscaHembraCannon();

difference()
{
    translate([-30,-30,0])
    cube([60,60,7]);
    
    /*
    translate([-45/2,-45/2,-0.1])
    cube([45,45,15]);*/
    
    translate([0,0,-0.1])
    cylinder(r=55/2,14+1,$fn=100);
    
}
}



module navajasCorto()
{
    difference()
    {
        translate([0,0,navajasH])
        rotate([0,180,0])
        creaNavajas( navajasH );
        
        translate([0,0,-0.2])
        cuboMasPared(49,49,30,30,15);
        
    }
}
